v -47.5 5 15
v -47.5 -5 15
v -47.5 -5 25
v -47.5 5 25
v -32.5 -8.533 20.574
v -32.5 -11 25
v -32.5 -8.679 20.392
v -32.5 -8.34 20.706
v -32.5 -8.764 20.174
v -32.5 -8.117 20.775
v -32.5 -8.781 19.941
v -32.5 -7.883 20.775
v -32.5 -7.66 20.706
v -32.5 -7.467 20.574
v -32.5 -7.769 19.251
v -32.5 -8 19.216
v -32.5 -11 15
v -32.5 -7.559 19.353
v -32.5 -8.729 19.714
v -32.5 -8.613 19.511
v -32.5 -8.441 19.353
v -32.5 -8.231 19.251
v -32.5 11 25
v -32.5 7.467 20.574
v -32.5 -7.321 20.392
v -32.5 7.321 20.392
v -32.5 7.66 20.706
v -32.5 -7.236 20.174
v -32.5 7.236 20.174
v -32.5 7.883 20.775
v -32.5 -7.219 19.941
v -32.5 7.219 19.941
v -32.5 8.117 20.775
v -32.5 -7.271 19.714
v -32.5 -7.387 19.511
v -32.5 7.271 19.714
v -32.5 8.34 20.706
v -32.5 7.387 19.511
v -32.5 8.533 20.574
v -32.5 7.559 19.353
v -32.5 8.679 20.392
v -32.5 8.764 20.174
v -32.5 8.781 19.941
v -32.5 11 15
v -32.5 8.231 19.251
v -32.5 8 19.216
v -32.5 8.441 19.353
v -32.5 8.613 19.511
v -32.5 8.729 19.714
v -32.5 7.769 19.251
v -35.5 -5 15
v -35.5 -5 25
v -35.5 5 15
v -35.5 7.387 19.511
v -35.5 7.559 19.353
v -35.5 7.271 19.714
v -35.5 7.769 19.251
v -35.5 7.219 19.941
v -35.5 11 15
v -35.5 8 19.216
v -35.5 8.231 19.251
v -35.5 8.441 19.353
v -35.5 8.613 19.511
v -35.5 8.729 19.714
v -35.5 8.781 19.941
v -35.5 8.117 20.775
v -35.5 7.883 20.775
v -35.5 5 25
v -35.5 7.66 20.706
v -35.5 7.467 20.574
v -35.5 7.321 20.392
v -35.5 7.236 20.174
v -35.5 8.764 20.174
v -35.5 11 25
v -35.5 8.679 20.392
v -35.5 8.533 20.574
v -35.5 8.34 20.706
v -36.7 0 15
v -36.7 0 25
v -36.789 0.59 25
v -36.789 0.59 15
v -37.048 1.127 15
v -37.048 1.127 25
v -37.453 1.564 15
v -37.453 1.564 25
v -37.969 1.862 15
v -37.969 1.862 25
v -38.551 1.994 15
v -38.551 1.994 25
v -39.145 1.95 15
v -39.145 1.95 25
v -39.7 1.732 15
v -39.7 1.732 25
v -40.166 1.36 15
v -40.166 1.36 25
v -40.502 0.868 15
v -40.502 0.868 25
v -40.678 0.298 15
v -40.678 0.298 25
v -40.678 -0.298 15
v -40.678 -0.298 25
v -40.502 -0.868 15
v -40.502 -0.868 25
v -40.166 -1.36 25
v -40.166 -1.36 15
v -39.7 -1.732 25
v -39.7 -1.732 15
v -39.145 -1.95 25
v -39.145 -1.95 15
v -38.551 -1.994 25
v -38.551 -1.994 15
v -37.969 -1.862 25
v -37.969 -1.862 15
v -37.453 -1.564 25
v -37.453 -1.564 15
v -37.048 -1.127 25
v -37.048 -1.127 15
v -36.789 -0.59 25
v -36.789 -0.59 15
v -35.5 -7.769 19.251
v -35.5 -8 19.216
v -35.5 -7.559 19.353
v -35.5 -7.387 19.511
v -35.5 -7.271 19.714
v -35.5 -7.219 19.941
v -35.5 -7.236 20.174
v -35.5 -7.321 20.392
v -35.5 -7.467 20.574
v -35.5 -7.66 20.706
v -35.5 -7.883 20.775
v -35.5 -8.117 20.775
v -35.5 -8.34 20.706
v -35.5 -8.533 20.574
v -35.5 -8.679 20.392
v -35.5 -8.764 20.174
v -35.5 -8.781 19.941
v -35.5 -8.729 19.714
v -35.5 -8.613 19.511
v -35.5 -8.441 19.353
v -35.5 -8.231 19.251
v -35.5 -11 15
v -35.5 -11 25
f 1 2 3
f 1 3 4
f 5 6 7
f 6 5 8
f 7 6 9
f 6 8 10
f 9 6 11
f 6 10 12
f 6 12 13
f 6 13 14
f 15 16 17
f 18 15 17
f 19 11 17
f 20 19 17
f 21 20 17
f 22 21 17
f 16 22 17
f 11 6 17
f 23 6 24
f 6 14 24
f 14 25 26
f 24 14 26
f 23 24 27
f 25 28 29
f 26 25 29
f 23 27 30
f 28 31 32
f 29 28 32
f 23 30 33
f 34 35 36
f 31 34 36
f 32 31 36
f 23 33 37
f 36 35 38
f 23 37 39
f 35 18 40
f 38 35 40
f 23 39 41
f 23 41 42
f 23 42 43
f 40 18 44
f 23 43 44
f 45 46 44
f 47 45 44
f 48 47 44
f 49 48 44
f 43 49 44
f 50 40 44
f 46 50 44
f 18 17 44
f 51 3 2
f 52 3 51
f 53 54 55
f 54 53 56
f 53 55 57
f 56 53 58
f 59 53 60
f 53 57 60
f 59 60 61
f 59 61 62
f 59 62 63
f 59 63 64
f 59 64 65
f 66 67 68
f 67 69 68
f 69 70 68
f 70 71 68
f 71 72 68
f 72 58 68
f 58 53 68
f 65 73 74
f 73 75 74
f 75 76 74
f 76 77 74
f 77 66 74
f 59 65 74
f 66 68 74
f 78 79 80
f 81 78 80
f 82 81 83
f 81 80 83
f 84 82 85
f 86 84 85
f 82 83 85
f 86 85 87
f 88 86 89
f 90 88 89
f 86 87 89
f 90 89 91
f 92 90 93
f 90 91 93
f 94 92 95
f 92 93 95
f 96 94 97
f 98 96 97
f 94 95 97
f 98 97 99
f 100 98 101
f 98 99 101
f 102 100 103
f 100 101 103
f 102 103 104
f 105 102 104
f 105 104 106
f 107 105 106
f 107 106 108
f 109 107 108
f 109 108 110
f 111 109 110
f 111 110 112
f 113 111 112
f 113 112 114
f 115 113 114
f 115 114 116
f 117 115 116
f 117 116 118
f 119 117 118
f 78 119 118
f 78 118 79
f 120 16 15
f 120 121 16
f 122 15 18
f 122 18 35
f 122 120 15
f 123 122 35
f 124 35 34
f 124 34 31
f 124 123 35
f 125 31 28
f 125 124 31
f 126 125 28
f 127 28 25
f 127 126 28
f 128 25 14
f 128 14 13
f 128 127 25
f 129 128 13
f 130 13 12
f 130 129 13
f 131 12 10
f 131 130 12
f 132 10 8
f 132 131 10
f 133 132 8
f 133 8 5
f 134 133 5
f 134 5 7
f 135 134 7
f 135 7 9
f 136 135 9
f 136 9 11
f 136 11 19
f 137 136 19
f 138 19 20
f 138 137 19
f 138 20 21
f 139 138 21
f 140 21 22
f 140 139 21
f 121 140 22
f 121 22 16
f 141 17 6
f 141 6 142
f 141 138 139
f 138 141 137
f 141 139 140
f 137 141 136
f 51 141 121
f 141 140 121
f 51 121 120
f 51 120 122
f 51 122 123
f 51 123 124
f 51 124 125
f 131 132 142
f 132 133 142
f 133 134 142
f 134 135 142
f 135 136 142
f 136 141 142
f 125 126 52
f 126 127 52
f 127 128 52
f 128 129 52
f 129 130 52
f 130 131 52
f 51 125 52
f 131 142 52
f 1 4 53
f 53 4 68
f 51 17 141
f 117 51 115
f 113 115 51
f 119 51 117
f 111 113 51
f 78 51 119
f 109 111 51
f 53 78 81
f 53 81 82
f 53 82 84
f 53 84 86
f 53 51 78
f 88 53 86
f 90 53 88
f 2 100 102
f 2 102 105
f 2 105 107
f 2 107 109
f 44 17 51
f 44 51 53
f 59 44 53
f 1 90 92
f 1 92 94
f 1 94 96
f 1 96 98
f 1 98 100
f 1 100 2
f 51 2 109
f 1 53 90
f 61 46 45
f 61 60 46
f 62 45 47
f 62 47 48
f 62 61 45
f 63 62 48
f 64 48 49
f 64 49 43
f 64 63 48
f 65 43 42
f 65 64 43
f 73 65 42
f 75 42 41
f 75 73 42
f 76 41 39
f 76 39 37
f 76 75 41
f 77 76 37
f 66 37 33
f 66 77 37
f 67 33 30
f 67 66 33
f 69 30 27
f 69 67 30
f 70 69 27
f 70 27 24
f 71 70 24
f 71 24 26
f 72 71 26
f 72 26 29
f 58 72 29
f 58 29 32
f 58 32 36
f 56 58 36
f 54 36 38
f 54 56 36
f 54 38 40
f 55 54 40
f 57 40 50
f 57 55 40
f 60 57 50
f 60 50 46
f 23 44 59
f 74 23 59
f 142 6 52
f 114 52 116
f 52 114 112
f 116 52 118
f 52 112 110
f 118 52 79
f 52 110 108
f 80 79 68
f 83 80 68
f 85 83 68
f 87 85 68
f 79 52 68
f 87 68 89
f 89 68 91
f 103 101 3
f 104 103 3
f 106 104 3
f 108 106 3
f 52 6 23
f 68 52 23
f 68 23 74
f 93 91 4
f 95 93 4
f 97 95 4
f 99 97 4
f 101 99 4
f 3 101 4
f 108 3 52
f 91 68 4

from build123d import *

# Parameters (mm, degrees)
SKETCH1_W                = 15
SKETCH1_H                = 22
BOSS_EXTRUDE1_DEPTH      = 10
SKETCH2_W                = 12
SKETCH2_H                = 6
CUT_EXTRUDE1_DEPTH       = 50.771980069
SKETCH3_W                = 12
SKETCH3_H                = 6
CUT_EXTRUDE2_DEPTH       = 50.771980069
F_4_0_4_DIAMETER_HOLE1_D = 4


with BuildPart() as part:
    # Sketch1 → Boss-Extrude1 (new body)
    with BuildSketch(Plane(origin=(0, 0, 15), x_dir=(-1, 0, 0), z_dir=(0, 0, -1))):
        with Locations((40, 0)):
            Rectangle(SKETCH1_W, SKETCH1_H)
    extrude(amount=-BOSS_EXTRUDE1_DEPTH)

    # Sketch2 → Cut-Extrude1 (cut, through all)
    with BuildSketch(Plane.XY.offset(25)):
        with Locations((-41.5, 8)):
            Rectangle(SKETCH2_W, SKETCH2_H)
    extrude(amount=-CUT_EXTRUDE1_DEPTH, mode=Mode.SUBTRACT)

    # Sketch3 → Cut-Extrude2 (cut, through all)
    with BuildSketch(Plane.XY.offset(25)):
        with Locations((-41.5, -8)):
            Rectangle(SKETCH3_W, SKETCH3_H)
    extrude(amount=-CUT_EXTRUDE2_DEPTH, mode=Mode.SUBTRACT)

    # Sketch4 → Cut-Revolve1 (revolve, cut)
    with BuildSketch(Plane.XY.offset(20), mode=Mode.PRIVATE) as cut_revolve1_sk:
        Polygon((-35.5, 8.7835), (-35.5, 8), (-32.5, 8), (-32.5, 8.7835), (-34.5, 8.7835), align=None)
    revolve(cut_revolve1_sk.sketch.rotate(Axis((-35.5, 8, 20), (1, 0, 0)), 270), axis=Axis((-35.5, 8, 20), (1, 0, 0)), mode=Mode.SUBTRACT)

    # Sketch5 → Cut-Revolve2 (revolve, cut)
    with BuildSketch(Plane.XY.offset(20), mode=Mode.PRIVATE) as cut_revolve2_sk:
        Polygon((-35.5, -7.2165), (-35.5, -8), (-32.5, -8), (-32.5, -7.2165), (-34.5, -7.2165), align=None)
    revolve(cut_revolve2_sk.sketch.rotate(Axis((-35.5, -8, 20), (1, 0, 0)), 270), axis=Axis((-35.5, -8, 20), (1, 0, 0)), mode=Mode.SUBTRACT)

    # Ø4.0 (4) Diameter Hole1 (through all)
    with Locations(Plane(origin=(0, 0, 15), x_dir=(-1, 0, 0), z_dir=(0, 0, -1))):
        with Locations((38.7, 0)):
            Hole(F_4_0_4_DIAMETER_HOLE1_D / 2)


solid = part.part
